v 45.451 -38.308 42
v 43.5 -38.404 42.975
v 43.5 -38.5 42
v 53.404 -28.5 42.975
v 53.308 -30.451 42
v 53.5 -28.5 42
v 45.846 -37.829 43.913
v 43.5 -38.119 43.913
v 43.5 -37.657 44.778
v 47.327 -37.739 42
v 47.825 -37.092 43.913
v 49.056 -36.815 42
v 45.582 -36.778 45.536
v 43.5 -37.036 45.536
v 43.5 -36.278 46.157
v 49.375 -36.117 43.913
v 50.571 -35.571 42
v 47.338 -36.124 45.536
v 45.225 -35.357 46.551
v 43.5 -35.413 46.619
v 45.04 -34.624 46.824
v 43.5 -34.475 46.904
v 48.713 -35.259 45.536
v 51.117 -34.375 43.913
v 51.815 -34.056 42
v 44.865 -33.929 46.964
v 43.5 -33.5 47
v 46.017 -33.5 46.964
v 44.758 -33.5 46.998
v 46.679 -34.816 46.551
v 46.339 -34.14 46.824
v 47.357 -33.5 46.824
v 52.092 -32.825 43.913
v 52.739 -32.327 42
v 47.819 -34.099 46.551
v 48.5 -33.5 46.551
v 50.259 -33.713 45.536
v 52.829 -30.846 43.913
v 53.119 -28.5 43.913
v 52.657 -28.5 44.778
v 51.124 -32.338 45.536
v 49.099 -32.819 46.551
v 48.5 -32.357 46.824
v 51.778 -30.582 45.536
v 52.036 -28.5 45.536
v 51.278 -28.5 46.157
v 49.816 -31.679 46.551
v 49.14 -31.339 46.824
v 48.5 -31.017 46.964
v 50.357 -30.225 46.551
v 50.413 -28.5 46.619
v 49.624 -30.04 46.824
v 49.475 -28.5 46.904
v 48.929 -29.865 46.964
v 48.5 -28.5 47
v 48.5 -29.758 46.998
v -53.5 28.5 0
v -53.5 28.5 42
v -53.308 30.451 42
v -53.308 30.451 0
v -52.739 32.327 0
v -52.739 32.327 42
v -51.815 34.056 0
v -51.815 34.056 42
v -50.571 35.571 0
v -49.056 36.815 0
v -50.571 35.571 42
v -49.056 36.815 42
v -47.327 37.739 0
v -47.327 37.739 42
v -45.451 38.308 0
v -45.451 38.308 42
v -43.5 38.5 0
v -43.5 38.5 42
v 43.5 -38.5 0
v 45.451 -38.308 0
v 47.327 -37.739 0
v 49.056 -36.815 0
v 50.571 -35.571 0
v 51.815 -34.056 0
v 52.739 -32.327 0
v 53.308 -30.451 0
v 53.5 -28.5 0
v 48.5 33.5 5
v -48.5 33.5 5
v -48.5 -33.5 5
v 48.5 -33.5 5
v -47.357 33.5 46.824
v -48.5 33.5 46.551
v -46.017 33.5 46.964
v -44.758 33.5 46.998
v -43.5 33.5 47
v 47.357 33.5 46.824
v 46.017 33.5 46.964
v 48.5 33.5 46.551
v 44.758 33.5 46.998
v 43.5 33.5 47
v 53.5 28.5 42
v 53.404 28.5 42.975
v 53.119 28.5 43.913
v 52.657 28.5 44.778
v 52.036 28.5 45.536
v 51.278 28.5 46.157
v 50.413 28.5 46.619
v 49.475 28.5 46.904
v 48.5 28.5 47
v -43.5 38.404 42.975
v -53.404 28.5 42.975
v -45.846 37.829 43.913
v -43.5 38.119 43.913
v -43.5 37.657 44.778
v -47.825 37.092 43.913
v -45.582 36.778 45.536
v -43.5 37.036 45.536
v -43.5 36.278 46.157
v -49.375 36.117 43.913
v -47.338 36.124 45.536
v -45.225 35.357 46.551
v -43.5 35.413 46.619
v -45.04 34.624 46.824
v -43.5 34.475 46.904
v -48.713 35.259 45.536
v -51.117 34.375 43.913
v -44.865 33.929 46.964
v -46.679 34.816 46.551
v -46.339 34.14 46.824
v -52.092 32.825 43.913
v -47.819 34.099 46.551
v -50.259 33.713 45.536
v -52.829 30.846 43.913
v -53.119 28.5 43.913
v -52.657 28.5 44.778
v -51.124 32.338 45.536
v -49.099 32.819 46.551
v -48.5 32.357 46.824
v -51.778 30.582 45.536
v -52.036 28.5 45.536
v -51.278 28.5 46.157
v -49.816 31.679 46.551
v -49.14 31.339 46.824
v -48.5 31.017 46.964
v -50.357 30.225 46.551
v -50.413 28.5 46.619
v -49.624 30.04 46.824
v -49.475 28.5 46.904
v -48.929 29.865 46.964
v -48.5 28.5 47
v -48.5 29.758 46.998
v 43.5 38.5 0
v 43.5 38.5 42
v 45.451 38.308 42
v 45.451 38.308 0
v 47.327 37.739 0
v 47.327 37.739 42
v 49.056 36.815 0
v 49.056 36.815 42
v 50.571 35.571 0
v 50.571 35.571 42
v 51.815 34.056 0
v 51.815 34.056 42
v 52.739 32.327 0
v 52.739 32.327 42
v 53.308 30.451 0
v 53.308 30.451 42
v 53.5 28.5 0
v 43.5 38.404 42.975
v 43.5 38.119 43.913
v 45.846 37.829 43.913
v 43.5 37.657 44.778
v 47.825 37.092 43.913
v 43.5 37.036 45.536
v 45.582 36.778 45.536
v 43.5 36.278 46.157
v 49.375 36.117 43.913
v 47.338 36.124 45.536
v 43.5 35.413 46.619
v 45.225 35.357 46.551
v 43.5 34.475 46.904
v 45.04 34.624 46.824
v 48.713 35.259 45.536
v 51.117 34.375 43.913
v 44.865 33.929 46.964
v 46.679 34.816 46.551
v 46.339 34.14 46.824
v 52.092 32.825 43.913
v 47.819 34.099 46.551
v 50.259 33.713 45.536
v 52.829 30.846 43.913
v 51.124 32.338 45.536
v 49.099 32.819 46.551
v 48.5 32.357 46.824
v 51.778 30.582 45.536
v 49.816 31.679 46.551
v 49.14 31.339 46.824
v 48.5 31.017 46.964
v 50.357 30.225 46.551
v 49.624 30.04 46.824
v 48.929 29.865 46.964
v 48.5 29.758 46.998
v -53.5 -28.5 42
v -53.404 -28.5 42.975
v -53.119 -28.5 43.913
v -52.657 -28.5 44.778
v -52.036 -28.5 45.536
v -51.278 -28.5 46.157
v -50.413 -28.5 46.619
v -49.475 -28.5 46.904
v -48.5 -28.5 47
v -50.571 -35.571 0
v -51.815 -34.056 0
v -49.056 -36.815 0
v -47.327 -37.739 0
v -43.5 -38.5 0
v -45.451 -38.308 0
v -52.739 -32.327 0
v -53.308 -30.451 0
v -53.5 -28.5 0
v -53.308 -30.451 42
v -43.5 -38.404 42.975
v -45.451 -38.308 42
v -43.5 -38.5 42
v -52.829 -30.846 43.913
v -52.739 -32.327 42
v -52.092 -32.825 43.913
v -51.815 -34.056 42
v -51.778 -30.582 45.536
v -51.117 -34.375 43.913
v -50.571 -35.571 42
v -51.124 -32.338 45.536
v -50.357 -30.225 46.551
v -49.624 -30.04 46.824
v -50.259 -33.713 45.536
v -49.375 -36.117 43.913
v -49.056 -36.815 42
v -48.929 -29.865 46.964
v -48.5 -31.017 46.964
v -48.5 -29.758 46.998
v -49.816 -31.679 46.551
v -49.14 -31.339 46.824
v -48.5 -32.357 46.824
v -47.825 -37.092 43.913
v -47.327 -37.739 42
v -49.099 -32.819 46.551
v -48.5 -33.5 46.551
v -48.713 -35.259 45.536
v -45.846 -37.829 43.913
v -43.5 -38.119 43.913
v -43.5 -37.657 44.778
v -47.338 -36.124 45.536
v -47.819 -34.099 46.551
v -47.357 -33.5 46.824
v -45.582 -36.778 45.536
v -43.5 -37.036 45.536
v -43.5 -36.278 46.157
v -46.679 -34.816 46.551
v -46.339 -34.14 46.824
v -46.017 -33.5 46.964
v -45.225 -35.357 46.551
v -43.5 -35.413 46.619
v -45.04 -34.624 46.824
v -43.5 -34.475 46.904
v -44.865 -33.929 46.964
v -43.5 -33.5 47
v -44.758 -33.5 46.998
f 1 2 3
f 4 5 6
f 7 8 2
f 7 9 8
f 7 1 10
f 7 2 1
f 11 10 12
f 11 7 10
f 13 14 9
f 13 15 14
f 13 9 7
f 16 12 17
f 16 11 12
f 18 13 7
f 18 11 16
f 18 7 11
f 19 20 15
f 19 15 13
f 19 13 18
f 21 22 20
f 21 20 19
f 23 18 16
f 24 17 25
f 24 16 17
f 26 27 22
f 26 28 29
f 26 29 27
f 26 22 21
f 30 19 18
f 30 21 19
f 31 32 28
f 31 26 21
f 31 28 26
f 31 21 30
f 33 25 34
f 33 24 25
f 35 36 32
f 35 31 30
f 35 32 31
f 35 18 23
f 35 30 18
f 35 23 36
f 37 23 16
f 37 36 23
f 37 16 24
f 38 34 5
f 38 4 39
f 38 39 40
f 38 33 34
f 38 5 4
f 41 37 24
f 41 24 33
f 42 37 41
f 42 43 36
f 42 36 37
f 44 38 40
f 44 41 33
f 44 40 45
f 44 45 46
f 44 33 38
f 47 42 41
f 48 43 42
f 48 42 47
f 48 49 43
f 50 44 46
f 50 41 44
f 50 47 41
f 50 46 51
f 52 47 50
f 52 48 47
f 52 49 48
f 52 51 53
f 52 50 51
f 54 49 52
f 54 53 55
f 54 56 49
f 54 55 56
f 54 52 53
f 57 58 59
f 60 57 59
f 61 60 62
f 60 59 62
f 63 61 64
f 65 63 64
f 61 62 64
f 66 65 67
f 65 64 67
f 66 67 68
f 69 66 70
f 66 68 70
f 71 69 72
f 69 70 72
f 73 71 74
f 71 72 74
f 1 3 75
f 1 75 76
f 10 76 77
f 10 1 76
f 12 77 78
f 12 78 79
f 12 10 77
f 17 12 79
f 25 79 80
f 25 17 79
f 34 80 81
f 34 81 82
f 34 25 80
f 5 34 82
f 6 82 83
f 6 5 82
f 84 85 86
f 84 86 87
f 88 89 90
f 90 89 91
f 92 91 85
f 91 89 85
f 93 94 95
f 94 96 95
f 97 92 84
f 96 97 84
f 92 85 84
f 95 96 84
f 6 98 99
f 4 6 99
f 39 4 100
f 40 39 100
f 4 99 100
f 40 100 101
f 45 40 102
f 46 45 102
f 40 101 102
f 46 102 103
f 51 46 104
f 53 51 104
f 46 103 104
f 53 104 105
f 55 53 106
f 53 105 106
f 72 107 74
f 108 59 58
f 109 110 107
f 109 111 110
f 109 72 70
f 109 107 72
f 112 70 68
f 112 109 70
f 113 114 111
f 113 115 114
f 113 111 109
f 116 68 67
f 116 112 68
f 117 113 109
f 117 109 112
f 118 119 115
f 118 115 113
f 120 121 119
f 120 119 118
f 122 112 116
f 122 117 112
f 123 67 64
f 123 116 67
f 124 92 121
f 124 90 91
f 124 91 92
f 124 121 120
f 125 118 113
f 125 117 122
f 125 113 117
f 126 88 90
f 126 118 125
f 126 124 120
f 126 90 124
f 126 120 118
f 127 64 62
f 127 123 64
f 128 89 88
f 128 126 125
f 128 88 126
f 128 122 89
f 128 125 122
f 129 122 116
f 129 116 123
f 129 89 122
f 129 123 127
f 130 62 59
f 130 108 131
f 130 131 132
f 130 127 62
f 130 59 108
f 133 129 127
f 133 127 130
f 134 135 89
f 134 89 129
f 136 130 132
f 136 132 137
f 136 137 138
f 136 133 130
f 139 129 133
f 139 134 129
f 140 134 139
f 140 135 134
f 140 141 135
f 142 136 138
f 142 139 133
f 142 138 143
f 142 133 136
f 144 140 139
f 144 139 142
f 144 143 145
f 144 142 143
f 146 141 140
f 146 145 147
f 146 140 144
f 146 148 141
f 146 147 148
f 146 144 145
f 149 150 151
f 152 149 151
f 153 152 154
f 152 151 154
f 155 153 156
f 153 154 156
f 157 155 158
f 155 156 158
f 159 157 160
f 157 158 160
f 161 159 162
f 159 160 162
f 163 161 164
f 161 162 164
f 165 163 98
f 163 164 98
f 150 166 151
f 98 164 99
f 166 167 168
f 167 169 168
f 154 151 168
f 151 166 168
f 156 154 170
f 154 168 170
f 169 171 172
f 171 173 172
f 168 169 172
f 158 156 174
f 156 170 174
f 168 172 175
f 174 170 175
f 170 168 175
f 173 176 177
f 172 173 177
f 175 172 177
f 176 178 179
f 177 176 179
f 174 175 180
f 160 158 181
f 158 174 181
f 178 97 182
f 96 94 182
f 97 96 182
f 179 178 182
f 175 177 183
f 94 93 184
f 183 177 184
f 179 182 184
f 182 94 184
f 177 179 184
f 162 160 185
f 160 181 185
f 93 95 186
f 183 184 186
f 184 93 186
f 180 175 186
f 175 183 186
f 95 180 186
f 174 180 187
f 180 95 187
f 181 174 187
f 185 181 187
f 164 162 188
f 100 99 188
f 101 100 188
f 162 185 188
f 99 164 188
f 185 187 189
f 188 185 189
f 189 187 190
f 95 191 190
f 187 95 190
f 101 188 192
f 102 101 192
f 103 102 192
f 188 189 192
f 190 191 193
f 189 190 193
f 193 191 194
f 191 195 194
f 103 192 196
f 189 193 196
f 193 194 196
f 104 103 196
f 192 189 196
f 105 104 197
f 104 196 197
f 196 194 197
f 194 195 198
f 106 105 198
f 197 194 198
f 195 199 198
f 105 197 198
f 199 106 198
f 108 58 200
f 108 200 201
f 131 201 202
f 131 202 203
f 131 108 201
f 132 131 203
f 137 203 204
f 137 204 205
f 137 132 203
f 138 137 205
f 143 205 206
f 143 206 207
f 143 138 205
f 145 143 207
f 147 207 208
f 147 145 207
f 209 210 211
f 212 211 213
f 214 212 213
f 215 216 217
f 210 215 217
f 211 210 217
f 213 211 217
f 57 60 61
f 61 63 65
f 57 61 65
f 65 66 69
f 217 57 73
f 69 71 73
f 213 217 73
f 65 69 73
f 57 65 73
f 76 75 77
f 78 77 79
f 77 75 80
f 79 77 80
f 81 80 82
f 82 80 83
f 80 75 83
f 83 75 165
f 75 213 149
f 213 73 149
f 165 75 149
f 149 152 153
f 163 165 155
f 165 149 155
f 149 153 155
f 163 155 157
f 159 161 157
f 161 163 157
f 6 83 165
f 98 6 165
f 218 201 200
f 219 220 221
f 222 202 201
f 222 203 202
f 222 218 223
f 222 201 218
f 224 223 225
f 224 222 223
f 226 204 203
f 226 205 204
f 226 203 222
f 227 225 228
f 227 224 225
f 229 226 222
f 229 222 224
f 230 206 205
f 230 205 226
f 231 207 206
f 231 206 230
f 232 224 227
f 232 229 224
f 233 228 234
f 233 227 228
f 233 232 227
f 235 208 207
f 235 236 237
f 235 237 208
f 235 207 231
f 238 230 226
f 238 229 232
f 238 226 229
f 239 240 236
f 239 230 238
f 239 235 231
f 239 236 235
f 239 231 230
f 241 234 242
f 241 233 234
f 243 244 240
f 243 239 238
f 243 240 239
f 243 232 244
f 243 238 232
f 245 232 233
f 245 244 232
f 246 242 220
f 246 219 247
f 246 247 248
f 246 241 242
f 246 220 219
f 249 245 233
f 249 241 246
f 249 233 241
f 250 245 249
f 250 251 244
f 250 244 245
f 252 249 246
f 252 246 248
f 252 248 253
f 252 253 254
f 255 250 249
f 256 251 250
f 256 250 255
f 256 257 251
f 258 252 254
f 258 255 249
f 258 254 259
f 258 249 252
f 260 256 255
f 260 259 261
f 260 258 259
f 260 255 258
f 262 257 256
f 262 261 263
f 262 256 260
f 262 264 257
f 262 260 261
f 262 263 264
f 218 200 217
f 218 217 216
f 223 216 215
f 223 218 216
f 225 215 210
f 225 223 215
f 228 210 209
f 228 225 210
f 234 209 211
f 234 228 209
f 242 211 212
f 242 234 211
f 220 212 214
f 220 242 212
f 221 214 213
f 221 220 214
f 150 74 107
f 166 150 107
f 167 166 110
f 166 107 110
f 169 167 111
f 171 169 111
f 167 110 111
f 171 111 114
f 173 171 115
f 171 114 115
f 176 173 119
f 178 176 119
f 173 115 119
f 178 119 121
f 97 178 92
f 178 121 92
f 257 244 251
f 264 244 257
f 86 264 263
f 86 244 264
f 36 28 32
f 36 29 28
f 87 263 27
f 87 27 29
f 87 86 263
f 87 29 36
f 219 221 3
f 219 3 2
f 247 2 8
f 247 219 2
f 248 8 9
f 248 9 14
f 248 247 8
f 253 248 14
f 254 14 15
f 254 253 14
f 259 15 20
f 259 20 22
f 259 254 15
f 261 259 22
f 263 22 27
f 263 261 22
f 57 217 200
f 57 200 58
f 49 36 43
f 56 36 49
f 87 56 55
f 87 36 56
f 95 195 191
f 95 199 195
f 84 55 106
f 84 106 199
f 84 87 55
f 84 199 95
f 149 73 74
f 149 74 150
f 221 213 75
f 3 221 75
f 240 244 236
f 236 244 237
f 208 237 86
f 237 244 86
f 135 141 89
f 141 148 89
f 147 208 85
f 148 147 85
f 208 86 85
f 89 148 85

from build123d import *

# Parameters (mm, degrees)
F0_W         = 97
F0_H         = 67
F1_DEPTH     = 5
F0_W_2       = 107
F0_H_2       = 77
F2_DEPTH     = 47
F3_R         = 10
F4_T1_DEPTH  = 87
F4_T3_DEPTH  = 57
F4_T6_ANGLE  = 90
F4_T8_ANGLE  = 90
F4_T10_ANGLE = 90
F4_T12_ANGLE = 90


# Not quite as in the source:
# - a fillet or chamfer that OpenCascade refuses, or shapes differently, is made with other operations: its cross-section is extruded or revolved along the edge and cut away or added


with BuildPart() as f1:
    # F0 (on Top) → F1 (new body)
    with BuildSketch(Plane.XY):
        Rectangle(F0_W, F0_H)
    extrude(amount=F1_DEPTH)

    # F0 (on Top) → F2 (join)
    with BuildSketch(Plane.XY):
        Rectangle(F0_W_2, F0_H_2)
        Rectangle(F0_W, F0_H, mode=Mode.SUBTRACT)
    extrude(amount=F2_DEPTH)

    # F3
    f3_edges = [f1.edges().sort_by_distance(p)[0] for p in [
        (-53.5, 38.5, 23.5),
        (53.5, 38.5, 23.5),
        (53.5, -38.5, 23.5),
        (-53.5, -38.5, 23.5),
    ]]
    fillet(f3_edges, radius=F3_R)

    # F4: fillet of radius 5 on 8 edges, made by hand

    # F4_s2 → F4_t1 (cut)
    with BuildSketch(Plane.YZ.offset(-43.5)):
        with BuildLine():
            ThreePointArc((-38.5, 42), (-37.0355339059, 45.5355339059), (-33.5, 47))
            Line((-33.5, 47), (-38.5, 47))
            Line((-38.5, 47), (-38.5, 42))
        make_face()
        with BuildLine():
            ThreePointArc((38.5, 42), (37.0355339059, 45.5355339059), (33.5, 47))
            Line((33.5, 47), (38.5, 47))
            Line((38.5, 47), (38.5, 42))
        make_face()
    extrude(amount=F4_T1_DEPTH, mode=Mode.SUBTRACT)

    # F4_s4 → F4_t3 (cut)
    with BuildSketch(Plane.XZ.offset(-28.5)):
        with BuildLine():
            ThreePointArc((53.5, 42), (52.0355339059, 45.5355339059), (48.5, 47))
            Line((48.5, 47), (53.5, 47))
            Line((53.5, 47), (53.5, 42))
        make_face()
        with BuildLine():
            ThreePointArc((-53.5, 42), (-52.0355339059, 45.5355339059), (-48.5, 47))
            Line((-48.5, 47), (-53.5, 47))
            Line((-53.5, 47), (-53.5, 42))
        make_face()
    extrude(amount=F4_T3_DEPTH, mode=Mode.SUBTRACT)

    # F4_s5 → F4_t6 (revolve, cut)
    with BuildSketch(Plane.YZ.offset(43.5)):
        with BuildLine():
            ThreePointArc((38.5, 42), (37.0355339059, 45.5355339059), (33.5, 47))
            Line((33.5, 47), (38.5, 47))
            Line((38.5, 47), (38.5, 42))
        make_face()
    revolve(axis=Axis((43.5, 28.5, 47), (0, 0, -1)), revolution_arc=F4_T6_ANGLE, mode=Mode.SUBTRACT)

    # F4_s7 → F4_t8 (revolve, cut)
    with BuildSketch(Plane.YZ.offset(-43.5)):
        with BuildLine():
            ThreePointArc((38.5, 42), (37.0355339059, 45.5355339059), (33.5, 47))
            Line((33.5, 47), (38.5, 47))
            Line((38.5, 47), (38.5, 42))
        make_face()
    revolve(axis=Axis((-43.5, 28.5, 47), (0, 0, 1)), revolution_arc=F4_T8_ANGLE, mode=Mode.SUBTRACT)

    # F4_s9 → F4_t10 (revolve, cut)
    with BuildSketch(Plane.YZ.offset(43.5)):
        with BuildLine():
            ThreePointArc((-38.5, 42), (-37.0355339059, 45.5355339059), (-33.5, 47))
            Line((-33.5, 47), (-38.5, 47))
            Line((-38.5, 47), (-38.5, 42))
        make_face()
    revolve(axis=Axis((43.5, -28.5, 47), (0, 0, 1)), revolution_arc=F4_T10_ANGLE, mode=Mode.SUBTRACT)

    # F4_s11 → F4_t12 (revolve, cut)
    with BuildSketch(Plane.XZ.offset(28.5)):
        with BuildLine():
            ThreePointArc((-53.5, 42), (-52.0355339059, 45.5355339059), (-48.5, 47))
            Line((-48.5, 47), (-53.5, 47))
            Line((-53.5, 47), (-53.5, 42))
        make_face()
    revolve(axis=Axis((-43.5, -28.5, 47), (0, 0, 1)), revolution_arc=F4_T12_ANGLE, mode=Mode.SUBTRACT)


solid = f1.part
